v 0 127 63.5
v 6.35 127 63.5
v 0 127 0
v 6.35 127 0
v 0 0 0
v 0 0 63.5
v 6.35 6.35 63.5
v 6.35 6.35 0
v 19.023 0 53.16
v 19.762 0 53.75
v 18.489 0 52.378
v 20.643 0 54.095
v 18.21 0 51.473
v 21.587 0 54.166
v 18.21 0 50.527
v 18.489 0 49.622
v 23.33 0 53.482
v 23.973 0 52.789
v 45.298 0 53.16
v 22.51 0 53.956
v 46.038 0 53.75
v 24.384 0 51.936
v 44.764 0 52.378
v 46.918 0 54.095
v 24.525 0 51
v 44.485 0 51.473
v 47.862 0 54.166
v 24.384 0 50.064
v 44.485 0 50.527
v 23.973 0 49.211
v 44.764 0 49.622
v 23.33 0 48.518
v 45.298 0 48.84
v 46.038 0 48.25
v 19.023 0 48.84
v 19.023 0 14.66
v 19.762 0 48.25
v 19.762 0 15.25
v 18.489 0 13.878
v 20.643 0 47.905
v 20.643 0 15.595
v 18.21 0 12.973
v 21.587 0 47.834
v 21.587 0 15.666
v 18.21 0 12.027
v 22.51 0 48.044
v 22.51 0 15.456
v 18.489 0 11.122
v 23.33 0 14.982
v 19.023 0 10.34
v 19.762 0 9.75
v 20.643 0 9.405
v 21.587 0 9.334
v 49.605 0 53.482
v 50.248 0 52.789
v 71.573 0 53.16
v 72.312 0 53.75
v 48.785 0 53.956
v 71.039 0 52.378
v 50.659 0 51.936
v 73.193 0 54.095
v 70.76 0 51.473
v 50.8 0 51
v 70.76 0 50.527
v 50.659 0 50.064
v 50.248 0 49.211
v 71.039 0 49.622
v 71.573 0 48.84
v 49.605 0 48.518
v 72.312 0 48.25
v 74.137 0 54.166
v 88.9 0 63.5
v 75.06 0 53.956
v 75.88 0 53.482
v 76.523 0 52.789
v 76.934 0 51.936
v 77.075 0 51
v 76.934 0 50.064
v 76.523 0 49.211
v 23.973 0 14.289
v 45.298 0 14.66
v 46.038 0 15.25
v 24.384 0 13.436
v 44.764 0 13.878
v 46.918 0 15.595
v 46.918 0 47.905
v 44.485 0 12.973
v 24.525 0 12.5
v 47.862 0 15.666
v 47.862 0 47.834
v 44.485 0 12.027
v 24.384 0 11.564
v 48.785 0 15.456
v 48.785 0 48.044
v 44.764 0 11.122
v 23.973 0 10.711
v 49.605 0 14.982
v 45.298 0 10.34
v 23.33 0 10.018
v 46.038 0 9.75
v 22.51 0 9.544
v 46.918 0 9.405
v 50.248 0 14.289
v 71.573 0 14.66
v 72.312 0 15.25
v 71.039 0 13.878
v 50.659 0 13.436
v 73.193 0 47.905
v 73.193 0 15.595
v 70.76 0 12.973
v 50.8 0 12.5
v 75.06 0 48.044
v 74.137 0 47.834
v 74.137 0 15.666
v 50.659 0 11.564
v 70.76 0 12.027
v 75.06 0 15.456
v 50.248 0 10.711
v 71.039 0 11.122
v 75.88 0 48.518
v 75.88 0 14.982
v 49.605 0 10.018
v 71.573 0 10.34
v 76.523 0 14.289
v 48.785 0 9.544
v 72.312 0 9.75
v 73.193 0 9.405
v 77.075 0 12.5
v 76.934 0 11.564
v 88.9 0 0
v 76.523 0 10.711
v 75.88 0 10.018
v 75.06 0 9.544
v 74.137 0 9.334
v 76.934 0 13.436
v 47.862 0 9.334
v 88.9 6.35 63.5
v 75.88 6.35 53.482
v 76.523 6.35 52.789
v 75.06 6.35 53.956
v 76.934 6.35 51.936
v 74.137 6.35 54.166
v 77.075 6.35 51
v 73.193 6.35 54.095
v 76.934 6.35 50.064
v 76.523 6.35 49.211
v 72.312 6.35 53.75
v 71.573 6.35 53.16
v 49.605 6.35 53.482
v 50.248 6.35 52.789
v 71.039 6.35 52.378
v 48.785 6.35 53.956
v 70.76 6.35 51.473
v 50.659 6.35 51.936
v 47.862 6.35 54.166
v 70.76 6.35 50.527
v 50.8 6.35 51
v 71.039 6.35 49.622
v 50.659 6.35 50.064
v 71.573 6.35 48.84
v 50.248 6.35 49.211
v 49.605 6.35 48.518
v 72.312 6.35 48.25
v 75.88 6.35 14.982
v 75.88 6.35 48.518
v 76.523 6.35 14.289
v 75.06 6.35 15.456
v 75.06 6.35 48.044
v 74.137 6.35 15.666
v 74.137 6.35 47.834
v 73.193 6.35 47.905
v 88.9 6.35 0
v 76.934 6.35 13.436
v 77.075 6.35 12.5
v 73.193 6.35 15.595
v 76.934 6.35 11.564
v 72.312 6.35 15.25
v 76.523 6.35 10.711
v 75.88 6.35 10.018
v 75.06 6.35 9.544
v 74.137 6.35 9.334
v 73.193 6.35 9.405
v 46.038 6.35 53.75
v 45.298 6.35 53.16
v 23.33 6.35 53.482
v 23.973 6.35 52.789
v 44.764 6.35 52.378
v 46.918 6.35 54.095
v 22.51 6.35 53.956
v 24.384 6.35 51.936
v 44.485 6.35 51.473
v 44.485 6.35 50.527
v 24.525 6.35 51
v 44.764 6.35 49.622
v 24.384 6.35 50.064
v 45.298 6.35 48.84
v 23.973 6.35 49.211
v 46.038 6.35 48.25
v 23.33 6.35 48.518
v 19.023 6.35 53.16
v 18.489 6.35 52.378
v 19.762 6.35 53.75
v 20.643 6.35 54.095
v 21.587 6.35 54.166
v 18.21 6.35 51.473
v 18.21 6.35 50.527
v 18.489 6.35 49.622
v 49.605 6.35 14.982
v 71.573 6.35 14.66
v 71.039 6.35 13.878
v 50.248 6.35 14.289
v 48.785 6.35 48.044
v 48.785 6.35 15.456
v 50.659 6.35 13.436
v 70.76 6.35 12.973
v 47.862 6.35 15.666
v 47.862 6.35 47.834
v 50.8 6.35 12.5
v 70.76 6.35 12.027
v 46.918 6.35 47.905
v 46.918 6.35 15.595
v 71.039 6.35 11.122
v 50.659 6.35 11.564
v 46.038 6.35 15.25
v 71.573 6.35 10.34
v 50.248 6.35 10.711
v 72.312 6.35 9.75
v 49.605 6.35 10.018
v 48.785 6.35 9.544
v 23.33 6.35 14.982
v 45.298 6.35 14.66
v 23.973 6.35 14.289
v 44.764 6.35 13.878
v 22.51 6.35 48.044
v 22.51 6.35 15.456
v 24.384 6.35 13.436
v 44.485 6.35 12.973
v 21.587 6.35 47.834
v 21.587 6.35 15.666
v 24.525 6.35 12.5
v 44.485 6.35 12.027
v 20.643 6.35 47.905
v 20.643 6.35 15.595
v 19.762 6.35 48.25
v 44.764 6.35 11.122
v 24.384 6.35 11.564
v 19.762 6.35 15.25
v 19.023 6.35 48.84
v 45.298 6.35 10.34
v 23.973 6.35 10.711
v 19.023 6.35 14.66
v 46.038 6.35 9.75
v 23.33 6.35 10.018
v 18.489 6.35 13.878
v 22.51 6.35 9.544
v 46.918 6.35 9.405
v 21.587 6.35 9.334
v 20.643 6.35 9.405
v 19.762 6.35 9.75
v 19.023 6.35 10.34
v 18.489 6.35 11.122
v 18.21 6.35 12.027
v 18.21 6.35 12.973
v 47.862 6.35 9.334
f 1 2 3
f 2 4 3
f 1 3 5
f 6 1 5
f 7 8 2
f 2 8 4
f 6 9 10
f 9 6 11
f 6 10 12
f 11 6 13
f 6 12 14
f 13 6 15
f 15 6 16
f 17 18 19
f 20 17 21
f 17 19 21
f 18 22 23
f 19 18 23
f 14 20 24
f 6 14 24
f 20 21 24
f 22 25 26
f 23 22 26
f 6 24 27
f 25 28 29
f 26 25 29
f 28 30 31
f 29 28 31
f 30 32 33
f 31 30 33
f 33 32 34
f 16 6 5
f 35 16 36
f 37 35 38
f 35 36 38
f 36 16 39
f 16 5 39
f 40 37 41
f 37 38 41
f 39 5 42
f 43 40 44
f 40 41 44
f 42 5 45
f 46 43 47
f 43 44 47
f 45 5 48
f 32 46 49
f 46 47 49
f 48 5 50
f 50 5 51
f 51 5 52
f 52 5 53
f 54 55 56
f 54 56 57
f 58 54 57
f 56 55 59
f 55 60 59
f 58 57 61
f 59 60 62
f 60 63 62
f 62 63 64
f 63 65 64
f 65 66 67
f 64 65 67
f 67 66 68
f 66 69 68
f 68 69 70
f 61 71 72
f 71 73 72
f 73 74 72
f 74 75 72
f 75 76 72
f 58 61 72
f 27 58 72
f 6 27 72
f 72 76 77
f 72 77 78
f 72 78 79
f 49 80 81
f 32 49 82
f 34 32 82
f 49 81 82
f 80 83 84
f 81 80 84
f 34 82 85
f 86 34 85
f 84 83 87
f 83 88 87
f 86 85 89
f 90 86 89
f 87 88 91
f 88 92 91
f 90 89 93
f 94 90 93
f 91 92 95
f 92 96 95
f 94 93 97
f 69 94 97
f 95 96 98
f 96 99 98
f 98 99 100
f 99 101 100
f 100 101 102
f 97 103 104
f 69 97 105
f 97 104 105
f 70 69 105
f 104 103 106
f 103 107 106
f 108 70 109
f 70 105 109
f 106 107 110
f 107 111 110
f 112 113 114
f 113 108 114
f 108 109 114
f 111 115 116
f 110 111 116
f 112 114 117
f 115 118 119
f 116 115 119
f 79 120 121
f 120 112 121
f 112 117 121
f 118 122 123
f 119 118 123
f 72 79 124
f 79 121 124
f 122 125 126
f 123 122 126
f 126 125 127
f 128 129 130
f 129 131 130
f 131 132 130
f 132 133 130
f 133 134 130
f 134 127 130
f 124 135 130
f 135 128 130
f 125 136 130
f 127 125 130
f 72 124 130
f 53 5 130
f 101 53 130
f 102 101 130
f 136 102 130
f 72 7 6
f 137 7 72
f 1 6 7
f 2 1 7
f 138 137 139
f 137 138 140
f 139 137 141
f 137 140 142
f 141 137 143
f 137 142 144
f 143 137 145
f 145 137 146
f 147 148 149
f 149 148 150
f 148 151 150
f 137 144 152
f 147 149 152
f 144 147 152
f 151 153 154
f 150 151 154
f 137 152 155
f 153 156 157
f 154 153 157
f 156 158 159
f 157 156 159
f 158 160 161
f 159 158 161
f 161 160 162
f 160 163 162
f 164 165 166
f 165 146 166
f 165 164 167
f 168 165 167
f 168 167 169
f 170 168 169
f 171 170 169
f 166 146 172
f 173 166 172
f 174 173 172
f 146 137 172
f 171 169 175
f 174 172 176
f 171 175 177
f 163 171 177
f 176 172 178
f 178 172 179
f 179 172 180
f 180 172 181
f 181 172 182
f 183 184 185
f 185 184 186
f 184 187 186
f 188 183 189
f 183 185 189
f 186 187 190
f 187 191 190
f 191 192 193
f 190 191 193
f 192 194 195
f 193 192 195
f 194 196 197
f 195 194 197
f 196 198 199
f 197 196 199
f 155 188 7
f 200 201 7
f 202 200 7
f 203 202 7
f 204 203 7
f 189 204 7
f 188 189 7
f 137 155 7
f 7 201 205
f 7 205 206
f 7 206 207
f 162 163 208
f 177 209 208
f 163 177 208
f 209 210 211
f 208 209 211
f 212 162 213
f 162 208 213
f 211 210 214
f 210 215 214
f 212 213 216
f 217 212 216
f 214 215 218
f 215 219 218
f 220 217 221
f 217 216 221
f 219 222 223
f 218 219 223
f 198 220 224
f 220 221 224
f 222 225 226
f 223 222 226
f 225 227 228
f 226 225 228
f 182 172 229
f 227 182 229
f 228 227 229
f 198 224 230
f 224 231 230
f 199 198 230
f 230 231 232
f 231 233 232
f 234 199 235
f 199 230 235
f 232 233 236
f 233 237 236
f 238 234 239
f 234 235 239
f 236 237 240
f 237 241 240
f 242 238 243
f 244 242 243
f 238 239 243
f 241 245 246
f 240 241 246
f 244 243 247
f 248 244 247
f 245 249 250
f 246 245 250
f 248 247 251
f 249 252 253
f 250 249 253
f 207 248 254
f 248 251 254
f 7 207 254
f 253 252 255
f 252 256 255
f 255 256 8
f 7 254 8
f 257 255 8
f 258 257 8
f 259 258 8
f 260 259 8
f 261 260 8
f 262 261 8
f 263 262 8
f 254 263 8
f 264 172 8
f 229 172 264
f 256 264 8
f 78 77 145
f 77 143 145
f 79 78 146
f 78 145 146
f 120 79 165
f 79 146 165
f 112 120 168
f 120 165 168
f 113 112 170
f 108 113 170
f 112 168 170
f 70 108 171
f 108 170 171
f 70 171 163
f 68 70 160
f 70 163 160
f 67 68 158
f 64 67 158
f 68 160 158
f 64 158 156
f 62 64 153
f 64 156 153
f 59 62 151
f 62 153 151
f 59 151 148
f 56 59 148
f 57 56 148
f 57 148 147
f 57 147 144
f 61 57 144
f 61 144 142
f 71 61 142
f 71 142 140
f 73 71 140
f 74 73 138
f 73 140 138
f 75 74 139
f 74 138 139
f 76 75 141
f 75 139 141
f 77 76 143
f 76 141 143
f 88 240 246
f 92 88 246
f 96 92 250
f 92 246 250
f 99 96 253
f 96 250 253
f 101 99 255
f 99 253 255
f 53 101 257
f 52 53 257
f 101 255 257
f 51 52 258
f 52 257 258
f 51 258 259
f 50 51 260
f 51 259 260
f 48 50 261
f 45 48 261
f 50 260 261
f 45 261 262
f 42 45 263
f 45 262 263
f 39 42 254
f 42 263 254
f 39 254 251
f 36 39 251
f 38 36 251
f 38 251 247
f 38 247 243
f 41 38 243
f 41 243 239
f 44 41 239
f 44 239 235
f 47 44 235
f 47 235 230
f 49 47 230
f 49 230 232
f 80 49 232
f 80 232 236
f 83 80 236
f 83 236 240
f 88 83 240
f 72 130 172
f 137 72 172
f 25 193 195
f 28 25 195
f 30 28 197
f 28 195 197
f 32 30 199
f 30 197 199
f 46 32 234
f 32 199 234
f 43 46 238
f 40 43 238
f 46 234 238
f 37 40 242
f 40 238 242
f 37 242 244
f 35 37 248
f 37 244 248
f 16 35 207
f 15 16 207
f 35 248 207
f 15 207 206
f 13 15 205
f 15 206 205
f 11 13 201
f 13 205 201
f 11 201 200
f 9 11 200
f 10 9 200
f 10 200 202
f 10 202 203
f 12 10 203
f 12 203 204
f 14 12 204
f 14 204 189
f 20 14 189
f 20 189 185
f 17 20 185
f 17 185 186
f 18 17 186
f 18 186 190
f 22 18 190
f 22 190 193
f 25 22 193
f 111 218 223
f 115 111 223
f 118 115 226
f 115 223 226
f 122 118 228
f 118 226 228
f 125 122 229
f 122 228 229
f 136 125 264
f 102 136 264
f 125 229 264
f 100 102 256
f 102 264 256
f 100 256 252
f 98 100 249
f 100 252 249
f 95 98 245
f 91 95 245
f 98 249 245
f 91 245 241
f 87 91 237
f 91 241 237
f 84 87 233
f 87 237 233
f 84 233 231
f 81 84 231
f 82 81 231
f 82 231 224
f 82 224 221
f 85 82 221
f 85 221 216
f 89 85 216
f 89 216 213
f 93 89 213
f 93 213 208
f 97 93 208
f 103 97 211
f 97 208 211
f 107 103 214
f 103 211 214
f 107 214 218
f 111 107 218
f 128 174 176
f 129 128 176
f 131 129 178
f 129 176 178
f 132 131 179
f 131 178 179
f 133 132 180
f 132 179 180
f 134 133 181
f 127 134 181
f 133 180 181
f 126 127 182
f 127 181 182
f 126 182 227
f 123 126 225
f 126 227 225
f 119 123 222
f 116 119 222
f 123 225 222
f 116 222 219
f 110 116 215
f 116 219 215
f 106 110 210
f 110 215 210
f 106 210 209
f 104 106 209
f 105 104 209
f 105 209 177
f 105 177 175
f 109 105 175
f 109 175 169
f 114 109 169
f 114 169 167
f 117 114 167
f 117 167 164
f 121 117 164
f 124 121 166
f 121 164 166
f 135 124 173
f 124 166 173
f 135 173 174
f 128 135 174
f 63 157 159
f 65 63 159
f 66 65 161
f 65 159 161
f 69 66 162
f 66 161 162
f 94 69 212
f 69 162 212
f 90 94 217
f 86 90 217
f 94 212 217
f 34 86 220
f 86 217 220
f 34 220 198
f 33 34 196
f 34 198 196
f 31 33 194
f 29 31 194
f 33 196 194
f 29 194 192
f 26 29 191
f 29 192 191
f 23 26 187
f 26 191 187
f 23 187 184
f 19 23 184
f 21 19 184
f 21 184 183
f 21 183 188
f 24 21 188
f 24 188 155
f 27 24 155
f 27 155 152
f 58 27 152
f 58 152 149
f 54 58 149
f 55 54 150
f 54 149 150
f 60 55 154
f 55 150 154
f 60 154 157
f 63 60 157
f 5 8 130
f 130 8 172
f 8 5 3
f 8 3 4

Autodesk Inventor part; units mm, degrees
ref_plane "YZ Plane" through (0, 0, 0) normal (1, 0, 0) x (0, 1, 0)
ref_plane "XZ Plane" through (0, 0, 0) normal (0, 1, 0) x (-1, 0, 0)
ref_plane "XY Plane" through (0, 0, 0) normal (0, 0, 1) x (1, 0, 0)
sketch "Sketch1" plane through (0, 0, 0) normal (0, 0, 1) x (1, 0, 0)
  line L0 (0, 0) -> (88.9, 0)
  line L1 (88.9, 0) -> (88.9, 6.35)
  line L2 (88.9, 6.35) -> (6.35, 6.35)
  line L3 (6.35, 6.35) -> (6.35, 44.45)
  line L4 (6.35, 44.45) -> (6.35, 127)
  line L5 (6.35, 127) -> (0, 127)
  line L6 (0, 127) -> (0, 0)
  dimension "d0" = 88.9
  dimension "d1" = 127
  dimension "d2" = 6.35
extrude "Extrusion1" add sketch "Sketch1" along normal blind 63.5
sketch "Sketch2" plane through (6.35, 6.35, 0) normal (0, 1, 0) x (1, 0, 0)
  line L0 (67.55, -51) -> (15, -51) construction
  line L1 (15, -51) -> (15, -12.5) construction
  line L2 (15, -12.5) -> (67.55, -12.5) construction
  line L3 (67.55, -12.5) -> (67.55, -51) construction
  circle A0 centre (67.55, -51) radius 3.175
  circle A1 centre (67.55, -12.5) radius 3.175
  circle A2 centre (41.275, -51) radius 3.175
  circle A3 centre (41.275, -12.5) radius 3.175
  circle A4 centre (15, -51) radius 3.175
  circle A5 centre (15, -12.5) radius 3.175
  line L4 (0, 0) -> (82.55, 0) construction
  line L5 (82.55, 0) -> (82.55, -63.5) construction
  line L6 (82.55, -63.5) -> (0, -63.5) construction
  line L7 (0, -63.5) -> (0, 0) construction
  line L8 (67.55, -31.75) -> (82.55, -31.75) construction
  line L9 (15, -31.75) -> (0, -31.75) construction
  point P0 (-6.35, 0)
  dimension "d5" = 6.35
  dimension "d6" = 6.35
  dimension "d7" = 63.5
  dimension "d9" = 88.9
  dimension "d10" = 15
  dimension "d11" = 12.5
extrude "Extrusion2" cut sketch "Sketch2" against normal through all
properties part number "L_Channel" material "Steel, Mild"
